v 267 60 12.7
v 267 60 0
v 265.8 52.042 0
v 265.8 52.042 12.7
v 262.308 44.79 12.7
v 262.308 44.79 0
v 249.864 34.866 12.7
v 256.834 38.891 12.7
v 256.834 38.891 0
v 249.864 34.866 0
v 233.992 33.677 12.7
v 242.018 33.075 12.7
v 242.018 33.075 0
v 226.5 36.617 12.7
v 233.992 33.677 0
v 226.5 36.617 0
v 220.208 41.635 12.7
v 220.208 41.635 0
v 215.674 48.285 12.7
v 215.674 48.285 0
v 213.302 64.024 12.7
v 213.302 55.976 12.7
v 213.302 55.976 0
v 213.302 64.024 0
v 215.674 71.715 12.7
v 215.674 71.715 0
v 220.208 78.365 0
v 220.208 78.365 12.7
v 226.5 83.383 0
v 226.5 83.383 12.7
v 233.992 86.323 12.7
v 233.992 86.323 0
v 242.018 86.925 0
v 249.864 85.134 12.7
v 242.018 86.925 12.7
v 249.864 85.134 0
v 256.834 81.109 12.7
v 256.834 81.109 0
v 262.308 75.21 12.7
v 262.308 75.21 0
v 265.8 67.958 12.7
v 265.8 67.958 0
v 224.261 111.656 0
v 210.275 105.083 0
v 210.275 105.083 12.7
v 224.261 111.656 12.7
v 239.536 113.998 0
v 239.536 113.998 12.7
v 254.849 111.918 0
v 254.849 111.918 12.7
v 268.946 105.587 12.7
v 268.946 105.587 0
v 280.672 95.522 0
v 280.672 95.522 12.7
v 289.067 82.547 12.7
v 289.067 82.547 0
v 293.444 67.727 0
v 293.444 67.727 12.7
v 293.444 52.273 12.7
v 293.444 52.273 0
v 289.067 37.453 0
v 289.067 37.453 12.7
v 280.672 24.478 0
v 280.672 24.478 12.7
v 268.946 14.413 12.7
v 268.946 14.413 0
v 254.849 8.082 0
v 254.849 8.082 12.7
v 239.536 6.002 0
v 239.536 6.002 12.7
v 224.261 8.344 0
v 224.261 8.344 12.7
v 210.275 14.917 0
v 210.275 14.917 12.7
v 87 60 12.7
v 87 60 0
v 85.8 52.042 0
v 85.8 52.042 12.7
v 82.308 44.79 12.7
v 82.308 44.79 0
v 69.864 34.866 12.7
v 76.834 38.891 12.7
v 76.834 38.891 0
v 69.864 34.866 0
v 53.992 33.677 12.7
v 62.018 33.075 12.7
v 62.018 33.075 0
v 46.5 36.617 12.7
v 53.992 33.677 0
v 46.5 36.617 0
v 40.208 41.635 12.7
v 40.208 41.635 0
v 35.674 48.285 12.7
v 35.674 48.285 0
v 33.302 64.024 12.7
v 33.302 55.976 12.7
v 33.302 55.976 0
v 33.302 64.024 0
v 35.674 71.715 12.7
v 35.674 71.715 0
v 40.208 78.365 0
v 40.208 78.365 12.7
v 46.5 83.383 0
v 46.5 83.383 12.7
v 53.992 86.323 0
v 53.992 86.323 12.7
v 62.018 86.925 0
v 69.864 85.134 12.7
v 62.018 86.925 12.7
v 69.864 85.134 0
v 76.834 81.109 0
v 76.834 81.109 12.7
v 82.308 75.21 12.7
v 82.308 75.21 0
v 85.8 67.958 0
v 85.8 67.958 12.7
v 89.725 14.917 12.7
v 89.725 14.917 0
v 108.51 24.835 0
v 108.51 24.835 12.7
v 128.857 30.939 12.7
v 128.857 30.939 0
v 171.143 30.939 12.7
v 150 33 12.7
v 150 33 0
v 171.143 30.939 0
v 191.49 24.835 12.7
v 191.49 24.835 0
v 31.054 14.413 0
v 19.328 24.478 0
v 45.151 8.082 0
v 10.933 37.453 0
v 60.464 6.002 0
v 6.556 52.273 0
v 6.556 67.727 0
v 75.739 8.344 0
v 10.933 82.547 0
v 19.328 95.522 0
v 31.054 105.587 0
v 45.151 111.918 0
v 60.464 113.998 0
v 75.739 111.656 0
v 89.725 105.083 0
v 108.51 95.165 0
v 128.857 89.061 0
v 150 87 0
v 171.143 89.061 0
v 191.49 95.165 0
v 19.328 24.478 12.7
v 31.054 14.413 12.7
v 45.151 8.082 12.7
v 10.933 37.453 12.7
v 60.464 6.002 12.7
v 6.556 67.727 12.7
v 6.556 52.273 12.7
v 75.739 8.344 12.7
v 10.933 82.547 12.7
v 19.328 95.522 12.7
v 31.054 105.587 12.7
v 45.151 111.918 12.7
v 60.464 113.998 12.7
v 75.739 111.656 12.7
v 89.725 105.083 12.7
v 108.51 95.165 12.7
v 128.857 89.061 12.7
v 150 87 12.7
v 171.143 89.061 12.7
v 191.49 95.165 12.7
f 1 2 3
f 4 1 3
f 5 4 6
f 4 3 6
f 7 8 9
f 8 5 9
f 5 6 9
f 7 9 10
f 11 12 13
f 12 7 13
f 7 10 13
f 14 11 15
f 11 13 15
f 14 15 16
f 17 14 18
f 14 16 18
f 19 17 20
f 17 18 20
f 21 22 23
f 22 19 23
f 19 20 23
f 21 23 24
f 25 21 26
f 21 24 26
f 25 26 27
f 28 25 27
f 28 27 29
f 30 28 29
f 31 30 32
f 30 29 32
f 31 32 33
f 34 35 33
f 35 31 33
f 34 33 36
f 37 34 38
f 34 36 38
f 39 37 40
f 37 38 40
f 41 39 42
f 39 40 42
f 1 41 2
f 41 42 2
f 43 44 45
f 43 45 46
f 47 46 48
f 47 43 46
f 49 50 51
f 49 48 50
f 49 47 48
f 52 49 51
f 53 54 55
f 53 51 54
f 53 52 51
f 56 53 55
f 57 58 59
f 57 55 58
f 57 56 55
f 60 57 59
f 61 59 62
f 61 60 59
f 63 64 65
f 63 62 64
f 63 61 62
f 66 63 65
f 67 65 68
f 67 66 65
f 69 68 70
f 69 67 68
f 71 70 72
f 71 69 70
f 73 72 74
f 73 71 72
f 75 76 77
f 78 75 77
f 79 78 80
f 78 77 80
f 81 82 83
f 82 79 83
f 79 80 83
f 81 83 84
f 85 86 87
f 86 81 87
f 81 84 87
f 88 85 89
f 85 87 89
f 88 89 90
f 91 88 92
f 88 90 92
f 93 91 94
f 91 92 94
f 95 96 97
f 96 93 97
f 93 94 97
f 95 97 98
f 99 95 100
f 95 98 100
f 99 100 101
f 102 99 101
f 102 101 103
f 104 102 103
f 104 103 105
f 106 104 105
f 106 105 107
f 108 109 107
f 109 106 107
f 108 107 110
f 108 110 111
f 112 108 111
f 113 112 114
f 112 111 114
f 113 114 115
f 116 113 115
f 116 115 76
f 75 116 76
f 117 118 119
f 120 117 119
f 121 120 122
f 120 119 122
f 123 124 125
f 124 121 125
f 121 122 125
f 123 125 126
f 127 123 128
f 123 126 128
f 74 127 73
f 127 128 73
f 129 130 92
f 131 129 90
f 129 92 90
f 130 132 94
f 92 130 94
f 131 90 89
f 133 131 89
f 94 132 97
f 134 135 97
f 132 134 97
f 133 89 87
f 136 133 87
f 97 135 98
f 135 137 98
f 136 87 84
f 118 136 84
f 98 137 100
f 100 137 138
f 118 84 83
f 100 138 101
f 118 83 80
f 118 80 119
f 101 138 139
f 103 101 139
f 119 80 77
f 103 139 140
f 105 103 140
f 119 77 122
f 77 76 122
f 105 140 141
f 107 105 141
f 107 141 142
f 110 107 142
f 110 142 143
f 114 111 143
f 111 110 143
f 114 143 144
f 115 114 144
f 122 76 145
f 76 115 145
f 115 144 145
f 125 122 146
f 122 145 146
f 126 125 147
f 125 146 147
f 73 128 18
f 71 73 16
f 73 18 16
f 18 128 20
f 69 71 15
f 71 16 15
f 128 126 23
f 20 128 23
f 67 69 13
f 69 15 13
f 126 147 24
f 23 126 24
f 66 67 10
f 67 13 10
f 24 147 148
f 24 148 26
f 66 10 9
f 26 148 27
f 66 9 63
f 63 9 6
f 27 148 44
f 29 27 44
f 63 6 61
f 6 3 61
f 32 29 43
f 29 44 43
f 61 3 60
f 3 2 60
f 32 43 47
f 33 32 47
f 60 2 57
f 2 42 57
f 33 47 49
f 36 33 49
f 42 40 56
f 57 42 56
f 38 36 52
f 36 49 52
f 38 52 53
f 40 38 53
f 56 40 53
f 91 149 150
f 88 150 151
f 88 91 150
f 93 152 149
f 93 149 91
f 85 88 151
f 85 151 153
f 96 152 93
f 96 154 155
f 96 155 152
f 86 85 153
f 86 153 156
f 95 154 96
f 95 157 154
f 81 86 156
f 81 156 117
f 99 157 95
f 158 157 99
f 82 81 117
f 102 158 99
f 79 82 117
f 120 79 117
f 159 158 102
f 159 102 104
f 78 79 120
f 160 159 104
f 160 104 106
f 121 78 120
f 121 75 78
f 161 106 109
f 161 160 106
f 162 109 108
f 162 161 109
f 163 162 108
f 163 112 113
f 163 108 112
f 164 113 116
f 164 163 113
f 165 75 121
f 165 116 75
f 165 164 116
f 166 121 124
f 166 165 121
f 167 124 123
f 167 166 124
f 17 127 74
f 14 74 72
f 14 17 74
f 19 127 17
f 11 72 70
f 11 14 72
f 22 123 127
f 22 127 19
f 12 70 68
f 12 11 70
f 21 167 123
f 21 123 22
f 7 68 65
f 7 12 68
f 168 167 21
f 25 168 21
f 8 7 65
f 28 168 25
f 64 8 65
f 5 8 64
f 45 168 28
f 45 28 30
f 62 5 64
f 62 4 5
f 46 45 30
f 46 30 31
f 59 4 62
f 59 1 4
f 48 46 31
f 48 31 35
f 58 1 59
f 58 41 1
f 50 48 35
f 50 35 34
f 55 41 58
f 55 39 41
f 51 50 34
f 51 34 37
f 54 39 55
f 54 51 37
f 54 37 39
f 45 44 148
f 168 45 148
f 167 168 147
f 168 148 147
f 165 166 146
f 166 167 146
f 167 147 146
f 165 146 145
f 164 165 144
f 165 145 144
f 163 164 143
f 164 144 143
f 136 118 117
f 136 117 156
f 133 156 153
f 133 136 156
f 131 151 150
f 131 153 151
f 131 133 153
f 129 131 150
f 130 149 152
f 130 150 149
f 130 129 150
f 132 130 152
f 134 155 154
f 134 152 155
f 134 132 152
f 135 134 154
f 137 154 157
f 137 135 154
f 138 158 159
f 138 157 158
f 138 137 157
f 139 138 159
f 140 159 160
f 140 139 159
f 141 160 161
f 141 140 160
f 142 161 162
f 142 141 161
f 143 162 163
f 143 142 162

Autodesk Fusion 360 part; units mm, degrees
sketch "Sketch1" plane through (0, 0, 0) normal (0, 0, 1) x (1, 0, 0) in component "clamp"
  circle A0 centre (60, 60) radius 27
  circle A1 centre (240, 60) radius 27
  arc A2 (210.2752, 14.9174) -> (89.7248, 14.9174) centre (150, -76.5) ccw
  arc A3 (89.7248, 105.0826) -> (210.2752, 105.0826) centre (150, 196.5) ccw
  arc A4 (89.7248, 105.0826) -> (89.7248, 14.9174) centre (60, 60) ccw
  arc A5 (210.2752, 14.9174) -> (210.2752, 105.0826) centre (240, 60) ccw
  dimension "d1" = 54
  dimension "d2" = 54
  dimension "d6" = 180
  dimension "d9" = 54
  dimension "d10" = 54
extrude "Extrude1" add sketch "Sketch1" along normal blind 13 makes body 1 in component "clamp"
extrude "Extrude1'" add sketch "Sketch1" along normal blind 12.7 separate body makes body 2
component "clamp" placed x (1, 0, 0) y (0, 1, 0) z (0, 0, 1) at (0, 0, 0)
hidden bodies 1
equation "d2 = d1"
equation "d9 = d1"
equation "d10 = d1"
equation "d17 = 1/2\""
